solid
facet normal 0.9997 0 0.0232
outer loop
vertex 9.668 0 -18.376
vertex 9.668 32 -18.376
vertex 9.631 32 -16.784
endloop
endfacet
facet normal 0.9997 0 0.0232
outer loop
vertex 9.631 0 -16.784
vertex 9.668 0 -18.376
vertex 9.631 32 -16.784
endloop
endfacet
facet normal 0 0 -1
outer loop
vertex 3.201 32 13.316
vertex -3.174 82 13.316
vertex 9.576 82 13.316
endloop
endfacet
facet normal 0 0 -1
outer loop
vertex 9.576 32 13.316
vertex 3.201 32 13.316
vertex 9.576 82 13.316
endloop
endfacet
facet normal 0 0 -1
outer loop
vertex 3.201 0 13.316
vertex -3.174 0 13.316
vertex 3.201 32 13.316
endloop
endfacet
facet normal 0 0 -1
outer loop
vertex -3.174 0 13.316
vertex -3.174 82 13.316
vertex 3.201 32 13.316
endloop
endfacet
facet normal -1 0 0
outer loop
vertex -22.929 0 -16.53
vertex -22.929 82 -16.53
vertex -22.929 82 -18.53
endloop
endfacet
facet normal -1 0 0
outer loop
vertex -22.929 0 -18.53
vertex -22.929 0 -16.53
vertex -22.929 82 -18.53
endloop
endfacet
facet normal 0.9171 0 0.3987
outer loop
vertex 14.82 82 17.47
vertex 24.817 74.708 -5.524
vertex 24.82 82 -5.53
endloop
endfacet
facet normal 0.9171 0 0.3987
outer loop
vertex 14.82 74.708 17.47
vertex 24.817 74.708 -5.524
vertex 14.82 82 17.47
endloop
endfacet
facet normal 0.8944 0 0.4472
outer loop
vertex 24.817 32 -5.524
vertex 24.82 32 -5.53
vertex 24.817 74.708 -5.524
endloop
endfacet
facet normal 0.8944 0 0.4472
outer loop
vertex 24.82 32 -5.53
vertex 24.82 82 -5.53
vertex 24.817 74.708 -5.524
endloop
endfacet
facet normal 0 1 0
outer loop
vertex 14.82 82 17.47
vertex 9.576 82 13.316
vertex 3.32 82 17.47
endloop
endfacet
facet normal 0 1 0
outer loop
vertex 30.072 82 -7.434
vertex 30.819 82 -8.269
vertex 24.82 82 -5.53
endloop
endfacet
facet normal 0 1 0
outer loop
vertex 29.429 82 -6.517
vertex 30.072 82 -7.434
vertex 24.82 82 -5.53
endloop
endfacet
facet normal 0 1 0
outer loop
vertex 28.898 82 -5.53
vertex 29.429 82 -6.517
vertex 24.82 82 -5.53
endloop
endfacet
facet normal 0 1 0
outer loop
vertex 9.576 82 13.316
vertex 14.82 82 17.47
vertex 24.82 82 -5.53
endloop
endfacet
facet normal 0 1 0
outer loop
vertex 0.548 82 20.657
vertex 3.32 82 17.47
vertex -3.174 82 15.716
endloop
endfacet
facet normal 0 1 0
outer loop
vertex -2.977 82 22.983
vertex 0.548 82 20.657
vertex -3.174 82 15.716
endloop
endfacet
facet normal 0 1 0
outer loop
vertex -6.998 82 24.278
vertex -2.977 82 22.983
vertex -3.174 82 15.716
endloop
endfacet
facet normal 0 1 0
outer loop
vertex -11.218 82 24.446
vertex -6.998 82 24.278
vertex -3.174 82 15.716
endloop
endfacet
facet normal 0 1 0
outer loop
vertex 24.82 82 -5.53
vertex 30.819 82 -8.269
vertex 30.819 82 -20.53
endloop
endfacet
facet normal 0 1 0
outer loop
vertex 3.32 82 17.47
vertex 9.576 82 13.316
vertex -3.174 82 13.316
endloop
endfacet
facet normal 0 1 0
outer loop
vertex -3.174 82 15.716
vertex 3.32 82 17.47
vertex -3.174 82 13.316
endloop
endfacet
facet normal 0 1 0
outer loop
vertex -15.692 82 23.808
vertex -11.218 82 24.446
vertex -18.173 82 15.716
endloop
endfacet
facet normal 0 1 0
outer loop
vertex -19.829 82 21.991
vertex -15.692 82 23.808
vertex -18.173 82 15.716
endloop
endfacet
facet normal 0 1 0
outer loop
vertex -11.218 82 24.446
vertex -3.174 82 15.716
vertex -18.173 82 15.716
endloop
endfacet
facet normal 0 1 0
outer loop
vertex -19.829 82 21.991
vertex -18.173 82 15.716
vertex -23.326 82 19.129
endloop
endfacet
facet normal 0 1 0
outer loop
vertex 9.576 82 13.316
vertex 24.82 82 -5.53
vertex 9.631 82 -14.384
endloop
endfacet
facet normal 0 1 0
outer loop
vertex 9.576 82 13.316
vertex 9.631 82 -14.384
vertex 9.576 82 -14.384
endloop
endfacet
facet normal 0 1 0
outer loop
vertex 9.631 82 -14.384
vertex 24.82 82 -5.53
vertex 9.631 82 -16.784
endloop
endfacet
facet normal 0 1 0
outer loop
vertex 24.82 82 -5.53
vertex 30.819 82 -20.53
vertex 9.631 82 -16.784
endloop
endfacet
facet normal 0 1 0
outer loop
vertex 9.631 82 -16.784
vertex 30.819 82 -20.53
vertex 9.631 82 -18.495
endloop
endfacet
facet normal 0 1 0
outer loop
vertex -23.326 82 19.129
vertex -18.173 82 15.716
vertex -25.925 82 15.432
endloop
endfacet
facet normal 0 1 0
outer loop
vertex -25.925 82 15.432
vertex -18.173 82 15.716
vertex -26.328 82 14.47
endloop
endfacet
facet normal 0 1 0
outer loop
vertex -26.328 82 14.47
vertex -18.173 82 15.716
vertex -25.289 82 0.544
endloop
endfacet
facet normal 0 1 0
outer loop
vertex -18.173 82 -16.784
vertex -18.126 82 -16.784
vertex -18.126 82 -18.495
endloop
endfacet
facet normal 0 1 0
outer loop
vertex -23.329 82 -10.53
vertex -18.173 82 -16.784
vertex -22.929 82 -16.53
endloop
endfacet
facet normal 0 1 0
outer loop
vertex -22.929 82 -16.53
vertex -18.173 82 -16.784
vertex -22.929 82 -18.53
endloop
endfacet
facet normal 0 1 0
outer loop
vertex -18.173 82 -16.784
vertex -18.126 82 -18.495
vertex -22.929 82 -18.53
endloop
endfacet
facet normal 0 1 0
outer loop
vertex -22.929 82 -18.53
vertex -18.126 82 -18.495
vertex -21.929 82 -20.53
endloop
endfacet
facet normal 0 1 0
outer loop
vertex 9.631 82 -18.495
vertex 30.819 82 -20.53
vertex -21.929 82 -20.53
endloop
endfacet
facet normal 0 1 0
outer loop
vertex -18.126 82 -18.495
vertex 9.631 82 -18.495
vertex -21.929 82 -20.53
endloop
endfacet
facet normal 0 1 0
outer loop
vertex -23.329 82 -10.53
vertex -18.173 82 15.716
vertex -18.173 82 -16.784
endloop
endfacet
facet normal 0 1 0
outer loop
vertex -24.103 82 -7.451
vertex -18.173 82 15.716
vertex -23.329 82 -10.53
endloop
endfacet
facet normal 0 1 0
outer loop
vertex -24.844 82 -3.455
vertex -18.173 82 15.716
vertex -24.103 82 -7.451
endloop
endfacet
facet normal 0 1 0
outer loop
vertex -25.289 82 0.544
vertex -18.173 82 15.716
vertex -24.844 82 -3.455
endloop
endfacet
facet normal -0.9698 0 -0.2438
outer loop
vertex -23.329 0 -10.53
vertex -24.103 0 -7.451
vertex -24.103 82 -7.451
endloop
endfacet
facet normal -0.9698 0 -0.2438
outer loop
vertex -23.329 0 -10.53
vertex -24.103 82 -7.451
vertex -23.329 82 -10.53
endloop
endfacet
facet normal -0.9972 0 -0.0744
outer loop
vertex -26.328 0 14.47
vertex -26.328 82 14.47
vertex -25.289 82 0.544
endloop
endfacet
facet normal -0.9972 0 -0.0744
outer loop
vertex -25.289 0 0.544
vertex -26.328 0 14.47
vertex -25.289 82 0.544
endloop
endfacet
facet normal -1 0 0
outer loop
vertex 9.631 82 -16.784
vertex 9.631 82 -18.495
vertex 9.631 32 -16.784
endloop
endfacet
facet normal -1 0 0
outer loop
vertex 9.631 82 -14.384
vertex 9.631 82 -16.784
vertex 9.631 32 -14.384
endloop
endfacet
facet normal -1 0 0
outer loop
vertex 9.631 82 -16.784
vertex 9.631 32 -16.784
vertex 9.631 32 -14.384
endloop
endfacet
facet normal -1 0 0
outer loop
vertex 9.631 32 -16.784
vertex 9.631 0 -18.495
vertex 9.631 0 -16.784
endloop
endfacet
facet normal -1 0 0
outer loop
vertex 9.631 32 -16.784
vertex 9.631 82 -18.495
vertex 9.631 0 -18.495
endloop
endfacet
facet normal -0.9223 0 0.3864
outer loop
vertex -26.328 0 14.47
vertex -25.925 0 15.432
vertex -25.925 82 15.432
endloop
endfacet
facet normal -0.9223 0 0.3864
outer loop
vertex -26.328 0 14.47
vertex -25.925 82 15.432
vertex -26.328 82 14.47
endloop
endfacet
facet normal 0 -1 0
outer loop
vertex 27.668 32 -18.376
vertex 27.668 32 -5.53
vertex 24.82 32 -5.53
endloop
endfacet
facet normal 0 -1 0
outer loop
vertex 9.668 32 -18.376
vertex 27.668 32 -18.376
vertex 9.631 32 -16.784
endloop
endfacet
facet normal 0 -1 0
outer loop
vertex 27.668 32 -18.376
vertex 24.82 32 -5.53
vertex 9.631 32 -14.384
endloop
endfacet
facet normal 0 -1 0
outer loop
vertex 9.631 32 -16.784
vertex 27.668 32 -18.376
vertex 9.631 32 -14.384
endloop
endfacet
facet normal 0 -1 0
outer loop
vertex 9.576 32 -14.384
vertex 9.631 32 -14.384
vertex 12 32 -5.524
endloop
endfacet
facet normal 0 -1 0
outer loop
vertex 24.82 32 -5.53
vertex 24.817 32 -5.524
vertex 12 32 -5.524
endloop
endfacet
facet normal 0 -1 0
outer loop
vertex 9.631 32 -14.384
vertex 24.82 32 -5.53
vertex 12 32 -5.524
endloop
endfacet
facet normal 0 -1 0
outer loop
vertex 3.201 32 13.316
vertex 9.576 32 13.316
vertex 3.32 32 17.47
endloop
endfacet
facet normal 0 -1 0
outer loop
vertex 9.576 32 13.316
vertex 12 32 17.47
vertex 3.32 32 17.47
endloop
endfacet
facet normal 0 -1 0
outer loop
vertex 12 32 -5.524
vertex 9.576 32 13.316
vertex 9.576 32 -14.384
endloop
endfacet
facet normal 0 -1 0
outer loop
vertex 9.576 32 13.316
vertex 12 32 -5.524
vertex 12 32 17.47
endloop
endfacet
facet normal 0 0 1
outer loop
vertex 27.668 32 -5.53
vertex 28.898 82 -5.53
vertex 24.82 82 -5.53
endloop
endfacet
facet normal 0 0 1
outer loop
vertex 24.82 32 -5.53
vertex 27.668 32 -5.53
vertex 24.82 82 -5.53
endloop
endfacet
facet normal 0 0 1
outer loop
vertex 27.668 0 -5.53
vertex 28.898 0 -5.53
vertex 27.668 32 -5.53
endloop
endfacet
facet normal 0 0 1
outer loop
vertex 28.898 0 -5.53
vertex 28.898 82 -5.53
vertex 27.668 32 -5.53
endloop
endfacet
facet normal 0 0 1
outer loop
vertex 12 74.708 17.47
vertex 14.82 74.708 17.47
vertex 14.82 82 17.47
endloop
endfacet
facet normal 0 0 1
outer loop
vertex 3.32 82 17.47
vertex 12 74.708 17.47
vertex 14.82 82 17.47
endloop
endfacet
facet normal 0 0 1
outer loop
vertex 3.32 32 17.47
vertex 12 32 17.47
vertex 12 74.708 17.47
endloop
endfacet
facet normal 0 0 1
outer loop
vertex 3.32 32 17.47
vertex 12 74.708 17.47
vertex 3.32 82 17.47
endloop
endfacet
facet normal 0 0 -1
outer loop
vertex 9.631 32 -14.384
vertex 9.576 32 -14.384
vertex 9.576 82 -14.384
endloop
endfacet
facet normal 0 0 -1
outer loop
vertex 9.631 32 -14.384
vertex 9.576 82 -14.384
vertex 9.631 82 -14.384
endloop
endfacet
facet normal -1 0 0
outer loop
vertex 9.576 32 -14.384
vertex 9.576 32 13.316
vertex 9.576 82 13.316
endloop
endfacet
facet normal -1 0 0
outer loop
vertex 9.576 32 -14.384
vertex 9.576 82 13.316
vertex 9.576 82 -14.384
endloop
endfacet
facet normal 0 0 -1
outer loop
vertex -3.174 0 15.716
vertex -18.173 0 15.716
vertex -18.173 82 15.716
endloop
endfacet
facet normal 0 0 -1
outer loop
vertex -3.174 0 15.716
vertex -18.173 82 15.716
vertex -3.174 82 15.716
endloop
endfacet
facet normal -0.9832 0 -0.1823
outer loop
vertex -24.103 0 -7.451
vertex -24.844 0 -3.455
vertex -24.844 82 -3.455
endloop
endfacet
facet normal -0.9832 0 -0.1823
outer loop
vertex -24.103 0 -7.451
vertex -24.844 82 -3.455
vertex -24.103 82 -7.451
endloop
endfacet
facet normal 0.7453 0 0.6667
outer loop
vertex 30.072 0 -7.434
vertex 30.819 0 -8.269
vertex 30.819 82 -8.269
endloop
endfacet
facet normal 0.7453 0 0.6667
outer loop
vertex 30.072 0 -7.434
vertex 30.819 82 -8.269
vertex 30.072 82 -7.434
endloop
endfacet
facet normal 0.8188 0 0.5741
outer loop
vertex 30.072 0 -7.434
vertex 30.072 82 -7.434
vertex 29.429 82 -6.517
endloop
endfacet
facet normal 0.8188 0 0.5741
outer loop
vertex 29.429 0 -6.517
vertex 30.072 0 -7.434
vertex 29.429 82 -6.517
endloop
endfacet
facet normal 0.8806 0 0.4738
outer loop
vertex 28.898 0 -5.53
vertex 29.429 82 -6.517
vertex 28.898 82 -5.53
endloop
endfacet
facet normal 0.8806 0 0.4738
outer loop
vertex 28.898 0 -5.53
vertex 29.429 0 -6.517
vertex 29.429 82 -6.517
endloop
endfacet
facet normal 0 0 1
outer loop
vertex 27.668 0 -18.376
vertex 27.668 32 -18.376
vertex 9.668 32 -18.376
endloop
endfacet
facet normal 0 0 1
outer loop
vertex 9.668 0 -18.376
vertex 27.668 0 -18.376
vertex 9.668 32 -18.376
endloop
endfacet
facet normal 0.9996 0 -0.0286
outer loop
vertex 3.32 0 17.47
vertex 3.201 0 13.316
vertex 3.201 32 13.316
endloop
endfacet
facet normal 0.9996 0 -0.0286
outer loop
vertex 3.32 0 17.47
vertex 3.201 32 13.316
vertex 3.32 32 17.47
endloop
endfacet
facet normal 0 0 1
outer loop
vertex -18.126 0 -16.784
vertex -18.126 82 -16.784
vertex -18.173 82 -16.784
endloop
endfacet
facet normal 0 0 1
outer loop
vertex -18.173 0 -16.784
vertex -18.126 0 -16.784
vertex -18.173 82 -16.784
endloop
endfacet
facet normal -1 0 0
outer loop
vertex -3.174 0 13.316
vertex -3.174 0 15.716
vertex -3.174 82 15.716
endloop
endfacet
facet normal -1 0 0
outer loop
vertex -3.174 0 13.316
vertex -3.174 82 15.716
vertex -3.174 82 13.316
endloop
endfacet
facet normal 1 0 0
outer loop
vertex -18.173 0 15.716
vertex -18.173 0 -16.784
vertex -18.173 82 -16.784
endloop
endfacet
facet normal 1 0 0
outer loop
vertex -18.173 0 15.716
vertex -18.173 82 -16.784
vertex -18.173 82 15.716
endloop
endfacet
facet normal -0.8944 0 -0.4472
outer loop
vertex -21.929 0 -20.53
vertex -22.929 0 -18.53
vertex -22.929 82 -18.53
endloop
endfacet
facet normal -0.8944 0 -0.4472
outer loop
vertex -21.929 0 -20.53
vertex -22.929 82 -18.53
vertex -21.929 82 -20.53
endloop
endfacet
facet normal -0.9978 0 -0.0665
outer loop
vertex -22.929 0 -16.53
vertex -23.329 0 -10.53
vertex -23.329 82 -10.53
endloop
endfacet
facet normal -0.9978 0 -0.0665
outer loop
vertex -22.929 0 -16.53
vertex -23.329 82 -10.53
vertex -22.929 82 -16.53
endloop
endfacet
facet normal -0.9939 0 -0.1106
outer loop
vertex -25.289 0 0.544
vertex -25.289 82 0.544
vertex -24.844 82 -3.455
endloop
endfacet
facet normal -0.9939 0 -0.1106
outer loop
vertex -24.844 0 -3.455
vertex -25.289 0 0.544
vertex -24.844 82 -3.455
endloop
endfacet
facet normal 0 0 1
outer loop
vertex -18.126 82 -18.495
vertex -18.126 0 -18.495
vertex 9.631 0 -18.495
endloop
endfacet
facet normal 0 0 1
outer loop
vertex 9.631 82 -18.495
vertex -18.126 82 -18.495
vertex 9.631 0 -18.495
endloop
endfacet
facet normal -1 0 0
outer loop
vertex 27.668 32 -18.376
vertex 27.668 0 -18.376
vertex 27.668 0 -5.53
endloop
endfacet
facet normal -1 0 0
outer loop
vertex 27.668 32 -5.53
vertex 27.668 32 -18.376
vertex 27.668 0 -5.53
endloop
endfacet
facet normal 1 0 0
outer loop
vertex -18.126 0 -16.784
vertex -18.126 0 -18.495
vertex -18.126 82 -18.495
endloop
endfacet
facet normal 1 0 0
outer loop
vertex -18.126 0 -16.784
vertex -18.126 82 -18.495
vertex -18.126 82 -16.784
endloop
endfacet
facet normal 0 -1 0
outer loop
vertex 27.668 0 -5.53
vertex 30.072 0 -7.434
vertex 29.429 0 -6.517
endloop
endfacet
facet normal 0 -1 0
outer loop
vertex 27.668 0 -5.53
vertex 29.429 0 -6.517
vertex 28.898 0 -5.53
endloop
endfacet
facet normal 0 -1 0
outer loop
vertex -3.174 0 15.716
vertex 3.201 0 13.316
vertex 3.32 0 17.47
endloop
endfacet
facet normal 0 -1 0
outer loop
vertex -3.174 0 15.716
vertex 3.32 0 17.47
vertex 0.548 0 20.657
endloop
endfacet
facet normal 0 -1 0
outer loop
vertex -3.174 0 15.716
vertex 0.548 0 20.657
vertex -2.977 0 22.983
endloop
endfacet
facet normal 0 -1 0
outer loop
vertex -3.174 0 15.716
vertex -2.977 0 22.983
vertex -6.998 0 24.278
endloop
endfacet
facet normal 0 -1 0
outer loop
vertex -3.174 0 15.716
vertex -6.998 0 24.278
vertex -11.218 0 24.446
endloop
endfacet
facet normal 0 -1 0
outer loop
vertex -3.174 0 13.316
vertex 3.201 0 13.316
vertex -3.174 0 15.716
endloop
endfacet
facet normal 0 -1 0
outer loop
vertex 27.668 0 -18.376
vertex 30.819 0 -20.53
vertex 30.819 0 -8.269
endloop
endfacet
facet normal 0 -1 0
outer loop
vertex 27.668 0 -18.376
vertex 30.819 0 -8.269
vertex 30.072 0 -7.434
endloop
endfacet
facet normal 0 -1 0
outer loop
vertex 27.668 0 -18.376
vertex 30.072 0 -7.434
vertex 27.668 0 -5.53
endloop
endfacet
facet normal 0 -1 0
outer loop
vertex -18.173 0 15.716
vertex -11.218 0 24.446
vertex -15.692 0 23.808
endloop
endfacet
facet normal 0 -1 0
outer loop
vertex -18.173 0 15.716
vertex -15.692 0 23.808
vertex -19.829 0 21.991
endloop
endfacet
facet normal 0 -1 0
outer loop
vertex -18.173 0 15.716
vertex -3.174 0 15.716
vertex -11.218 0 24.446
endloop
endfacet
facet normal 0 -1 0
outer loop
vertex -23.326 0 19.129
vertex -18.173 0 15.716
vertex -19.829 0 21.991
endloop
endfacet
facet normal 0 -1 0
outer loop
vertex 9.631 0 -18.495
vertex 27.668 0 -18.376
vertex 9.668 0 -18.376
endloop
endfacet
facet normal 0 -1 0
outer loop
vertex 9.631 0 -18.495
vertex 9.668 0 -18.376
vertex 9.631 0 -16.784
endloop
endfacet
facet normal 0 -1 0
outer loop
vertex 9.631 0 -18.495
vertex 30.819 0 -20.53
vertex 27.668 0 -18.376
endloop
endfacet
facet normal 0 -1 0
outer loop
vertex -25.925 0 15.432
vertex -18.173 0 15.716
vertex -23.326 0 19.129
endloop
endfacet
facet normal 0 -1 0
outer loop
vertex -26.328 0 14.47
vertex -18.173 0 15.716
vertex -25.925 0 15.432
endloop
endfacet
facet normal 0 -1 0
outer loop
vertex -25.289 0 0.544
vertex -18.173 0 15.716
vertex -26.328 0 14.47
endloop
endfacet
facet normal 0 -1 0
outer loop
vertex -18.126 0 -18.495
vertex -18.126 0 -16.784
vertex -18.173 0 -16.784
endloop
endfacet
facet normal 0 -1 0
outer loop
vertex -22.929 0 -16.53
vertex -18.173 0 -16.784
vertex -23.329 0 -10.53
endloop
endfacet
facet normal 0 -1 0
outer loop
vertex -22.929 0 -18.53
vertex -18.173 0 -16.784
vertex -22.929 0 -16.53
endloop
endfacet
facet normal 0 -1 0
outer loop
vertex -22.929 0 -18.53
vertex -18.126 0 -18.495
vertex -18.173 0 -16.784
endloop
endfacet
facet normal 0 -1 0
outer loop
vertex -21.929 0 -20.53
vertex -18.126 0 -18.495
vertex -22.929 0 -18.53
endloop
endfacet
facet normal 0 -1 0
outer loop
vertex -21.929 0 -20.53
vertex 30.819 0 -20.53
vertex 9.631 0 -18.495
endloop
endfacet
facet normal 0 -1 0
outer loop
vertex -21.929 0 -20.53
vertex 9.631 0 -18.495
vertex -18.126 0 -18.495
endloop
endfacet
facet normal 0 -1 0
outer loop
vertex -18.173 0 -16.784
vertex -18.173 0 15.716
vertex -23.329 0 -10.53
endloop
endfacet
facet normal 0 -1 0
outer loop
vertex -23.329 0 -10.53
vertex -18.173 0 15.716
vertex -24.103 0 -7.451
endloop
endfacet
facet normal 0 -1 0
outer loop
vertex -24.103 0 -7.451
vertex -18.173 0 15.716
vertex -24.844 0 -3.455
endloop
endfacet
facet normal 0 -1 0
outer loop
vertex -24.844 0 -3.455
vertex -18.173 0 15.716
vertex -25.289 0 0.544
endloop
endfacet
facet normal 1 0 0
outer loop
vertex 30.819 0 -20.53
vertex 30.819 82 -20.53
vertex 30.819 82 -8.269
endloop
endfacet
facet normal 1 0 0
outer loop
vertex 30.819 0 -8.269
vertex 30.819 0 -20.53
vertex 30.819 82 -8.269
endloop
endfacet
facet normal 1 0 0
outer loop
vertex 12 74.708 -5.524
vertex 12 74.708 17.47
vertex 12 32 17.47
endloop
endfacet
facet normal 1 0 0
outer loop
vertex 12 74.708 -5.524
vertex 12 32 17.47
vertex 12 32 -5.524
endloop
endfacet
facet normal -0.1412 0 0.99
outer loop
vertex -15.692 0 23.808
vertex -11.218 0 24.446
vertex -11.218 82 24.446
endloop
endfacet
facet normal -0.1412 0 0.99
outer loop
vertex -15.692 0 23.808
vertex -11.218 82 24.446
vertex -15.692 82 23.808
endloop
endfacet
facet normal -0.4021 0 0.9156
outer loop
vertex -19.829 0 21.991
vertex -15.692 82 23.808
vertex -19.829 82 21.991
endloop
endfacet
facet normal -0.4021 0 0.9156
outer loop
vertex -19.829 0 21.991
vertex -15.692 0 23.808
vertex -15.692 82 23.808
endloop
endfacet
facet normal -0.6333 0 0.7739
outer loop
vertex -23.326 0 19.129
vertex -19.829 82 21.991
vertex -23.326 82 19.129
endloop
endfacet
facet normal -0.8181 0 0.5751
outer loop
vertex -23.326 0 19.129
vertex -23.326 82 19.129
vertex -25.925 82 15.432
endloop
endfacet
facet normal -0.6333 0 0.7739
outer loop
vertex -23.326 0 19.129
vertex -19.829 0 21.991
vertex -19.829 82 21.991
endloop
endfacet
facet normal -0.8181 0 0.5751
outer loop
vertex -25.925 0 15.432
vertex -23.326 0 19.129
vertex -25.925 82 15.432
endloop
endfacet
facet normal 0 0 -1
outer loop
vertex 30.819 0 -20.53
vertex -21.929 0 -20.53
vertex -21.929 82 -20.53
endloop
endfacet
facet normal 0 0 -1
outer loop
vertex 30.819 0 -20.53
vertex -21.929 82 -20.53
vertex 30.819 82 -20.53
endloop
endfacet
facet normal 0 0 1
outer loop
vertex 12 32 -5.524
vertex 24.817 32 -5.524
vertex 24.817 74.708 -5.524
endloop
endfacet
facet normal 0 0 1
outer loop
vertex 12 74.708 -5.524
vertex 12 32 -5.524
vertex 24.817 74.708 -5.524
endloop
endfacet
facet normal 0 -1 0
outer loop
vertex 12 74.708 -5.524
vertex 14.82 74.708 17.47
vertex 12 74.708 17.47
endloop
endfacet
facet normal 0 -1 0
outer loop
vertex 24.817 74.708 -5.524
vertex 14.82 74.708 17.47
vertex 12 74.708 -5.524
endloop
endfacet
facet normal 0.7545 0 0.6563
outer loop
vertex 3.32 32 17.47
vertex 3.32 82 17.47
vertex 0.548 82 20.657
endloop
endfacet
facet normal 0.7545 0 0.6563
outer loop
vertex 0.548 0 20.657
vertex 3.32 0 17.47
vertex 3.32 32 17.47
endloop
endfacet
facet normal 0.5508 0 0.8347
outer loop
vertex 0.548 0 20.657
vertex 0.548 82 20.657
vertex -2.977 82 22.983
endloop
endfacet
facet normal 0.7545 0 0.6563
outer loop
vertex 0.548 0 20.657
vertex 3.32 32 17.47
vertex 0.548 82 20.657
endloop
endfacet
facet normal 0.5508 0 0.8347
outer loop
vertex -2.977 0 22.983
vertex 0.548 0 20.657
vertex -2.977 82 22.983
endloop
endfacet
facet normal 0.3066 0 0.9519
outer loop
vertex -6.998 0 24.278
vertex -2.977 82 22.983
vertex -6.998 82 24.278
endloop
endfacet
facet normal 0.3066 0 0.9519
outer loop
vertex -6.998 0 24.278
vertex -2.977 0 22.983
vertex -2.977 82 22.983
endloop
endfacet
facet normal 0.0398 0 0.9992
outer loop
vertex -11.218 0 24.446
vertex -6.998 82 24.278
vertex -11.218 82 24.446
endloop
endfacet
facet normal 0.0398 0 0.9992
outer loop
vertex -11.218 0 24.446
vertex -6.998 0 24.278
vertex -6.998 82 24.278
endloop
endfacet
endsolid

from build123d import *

# Parameters (mm, degrees)
BOSS_EXTRUDE1_DEPTH = 82
CUT_EXTRUDE1_DEPTH  = 105
SKETCH3_W           = 23
SKETCH3_H           = 43
CUT_EXTRUDE2_DEPTH  = 28
CUT_EXTRUDE3_DEPTH  = 32
CUT_EXTRUDE4_DEPTH  = 32
SKETCH7_W           = 12.805148614
SKETCH7_H           = 2.400001526
CUT_EXTRUDE5_DEPTH  = 89
SKETCH8_W           = 27.756866021
SKETCH8_H           = 1.710281704
CUT_EXTRUDE6_DEPTH  = 89


with BuildPart() as part:
    # Sketch1 → Boss-Extrude1 (new body)
    with BuildSketch(Plane(origin=(0, 0, 0), x_dir=(1, 0, 0), z_dir=(0, 1, 0))):
        with BuildLine():
            Line((-21.9286378, 20.529965557), (30.819410356, 20.529965557))
            Line((30.819410356, 20.529965557), (30.819410356, 8.269460429))
            ThreePointArc((30.819410356, 8.269460429), (29.737157279, 6.984989328), (28.898083391, 5.52996605))
            Line((28.898083391, 5.52996605), (24.81959218, 5.52996605))
            Line((24.81959218, 5.52996605), (14.820019426, -17.47003395))
            Line((14.820019426, -17.47003395), (3.320446672, -17.47003395))
            ThreePointArc((3.320446672, -17.47003395), (-2.977277813, -22.983126936), (-11.218310652, -24.446310348))
            ThreePointArc((-11.218310652, -24.446310348), (-19.829053504, -21.990642561), (-25.924914656, -15.432009048))
            Line((-25.924914656, -15.432009048), (-26.328479109, -14.47003395))
            Line((-26.328479109, -14.47003395), (-25.288623152, -0.544399566))
            Line((-25.288623152, -0.544399566), (-24.844287214, 3.45451706))
            Line((-24.844287214, 3.45451706), (-24.102893172, 7.451406174))
            Line((-24.102893172, 7.451406174), (-23.328601179, 10.529965096))
            Line((-23.328601179, 10.529965096), (-22.928576765, 16.529967242))
            Line((-22.928576765, 16.529967242), (-22.928576765, 18.529964858))
            Line((-22.928576765, 18.529964858), (-21.9286378, 20.529965557))
        make_face()
    extrude(amount=BOSS_EXTRUDE1_DEPTH)

    # Sketch2 → Cut-Extrude1 (cut)
    with BuildSketch(Plane.XZ):
        Polygon((-18.173439963, -16.784486826), (-18.173439963, 15.715513413), (-3.173989279, 15.715513413), (-3.173989279, 13.315508549), (9.57552244, 13.315508549), (9.57552244, -14.3844853), (-3.173989279, -14.3844853), (-3.173989279, -16.784486826), align=None)
    extrude(amount=-CUT_EXTRUDE1_DEPTH, mode=Mode.SUBTRACT)

    # Sketch3 → Cut-Extrude2 (cut)
    with BuildSketch(Plane(origin=(40, 0, 0), x_dir=(0, 0, -1), z_dir=(1, 0, 0))):
        with Locations((-5.976477548, 53.208460465)):
            Rectangle(SKETCH3_W, SKETCH3_H)
    extrude(amount=-CUT_EXTRUDE2_DEPTH, mode=Mode.SUBTRACT)

    # Sketch5 → Cut-Extrude3 (cut)
    with BuildSketch(Plane.XZ):
        Polygon((14.820019426, 17.47003395), (24.81959218, -5.52996605), (14.820019426, -5.52996605), align=None)
    extrude(amount=-CUT_EXTRUDE3_DEPTH, mode=Mode.SUBTRACT)

    # Sketch6 → Cut-Extrude4 (cut)
    with BuildSketch(Plane.XZ):
        Polygon((27.668053931, -5.521484947), (27.668053931, -9.376004197), (27.668053931, -18.376004197), (9.668053931, -18.376004197), (9.57552244, -14.3844853), (9.57552244, 13.315508549), (3.20076658, 13.315508549), (3.320446672, 17.47003395), (14.820019426, 17.47003395), (14.820019426, -5.52996605), align=None)
    extrude(amount=-CUT_EXTRUDE4_DEPTH, mode=Mode.SUBTRACT)

    # Sketch7 → Cut-Extrude5 (cut)
    with BuildSketch(Plane.XZ):
        with Locations((3.228585028, -15.584486063)):
            Rectangle(SKETCH7_W, SKETCH7_H)
    extrude(amount=-CUT_EXTRUDE5_DEPTH, mode=Mode.SUBTRACT)

    # Sketch8 → Cut-Extrude6 (cut)
    with BuildSketch(Plane.XZ):
        with Locations((-4.247273675, -17.639627678)):
            Rectangle(SKETCH8_W, SKETCH8_H)
    extrude(amount=-CUT_EXTRUDE6_DEPTH, mode=Mode.SUBTRACT)


solid = part.part
